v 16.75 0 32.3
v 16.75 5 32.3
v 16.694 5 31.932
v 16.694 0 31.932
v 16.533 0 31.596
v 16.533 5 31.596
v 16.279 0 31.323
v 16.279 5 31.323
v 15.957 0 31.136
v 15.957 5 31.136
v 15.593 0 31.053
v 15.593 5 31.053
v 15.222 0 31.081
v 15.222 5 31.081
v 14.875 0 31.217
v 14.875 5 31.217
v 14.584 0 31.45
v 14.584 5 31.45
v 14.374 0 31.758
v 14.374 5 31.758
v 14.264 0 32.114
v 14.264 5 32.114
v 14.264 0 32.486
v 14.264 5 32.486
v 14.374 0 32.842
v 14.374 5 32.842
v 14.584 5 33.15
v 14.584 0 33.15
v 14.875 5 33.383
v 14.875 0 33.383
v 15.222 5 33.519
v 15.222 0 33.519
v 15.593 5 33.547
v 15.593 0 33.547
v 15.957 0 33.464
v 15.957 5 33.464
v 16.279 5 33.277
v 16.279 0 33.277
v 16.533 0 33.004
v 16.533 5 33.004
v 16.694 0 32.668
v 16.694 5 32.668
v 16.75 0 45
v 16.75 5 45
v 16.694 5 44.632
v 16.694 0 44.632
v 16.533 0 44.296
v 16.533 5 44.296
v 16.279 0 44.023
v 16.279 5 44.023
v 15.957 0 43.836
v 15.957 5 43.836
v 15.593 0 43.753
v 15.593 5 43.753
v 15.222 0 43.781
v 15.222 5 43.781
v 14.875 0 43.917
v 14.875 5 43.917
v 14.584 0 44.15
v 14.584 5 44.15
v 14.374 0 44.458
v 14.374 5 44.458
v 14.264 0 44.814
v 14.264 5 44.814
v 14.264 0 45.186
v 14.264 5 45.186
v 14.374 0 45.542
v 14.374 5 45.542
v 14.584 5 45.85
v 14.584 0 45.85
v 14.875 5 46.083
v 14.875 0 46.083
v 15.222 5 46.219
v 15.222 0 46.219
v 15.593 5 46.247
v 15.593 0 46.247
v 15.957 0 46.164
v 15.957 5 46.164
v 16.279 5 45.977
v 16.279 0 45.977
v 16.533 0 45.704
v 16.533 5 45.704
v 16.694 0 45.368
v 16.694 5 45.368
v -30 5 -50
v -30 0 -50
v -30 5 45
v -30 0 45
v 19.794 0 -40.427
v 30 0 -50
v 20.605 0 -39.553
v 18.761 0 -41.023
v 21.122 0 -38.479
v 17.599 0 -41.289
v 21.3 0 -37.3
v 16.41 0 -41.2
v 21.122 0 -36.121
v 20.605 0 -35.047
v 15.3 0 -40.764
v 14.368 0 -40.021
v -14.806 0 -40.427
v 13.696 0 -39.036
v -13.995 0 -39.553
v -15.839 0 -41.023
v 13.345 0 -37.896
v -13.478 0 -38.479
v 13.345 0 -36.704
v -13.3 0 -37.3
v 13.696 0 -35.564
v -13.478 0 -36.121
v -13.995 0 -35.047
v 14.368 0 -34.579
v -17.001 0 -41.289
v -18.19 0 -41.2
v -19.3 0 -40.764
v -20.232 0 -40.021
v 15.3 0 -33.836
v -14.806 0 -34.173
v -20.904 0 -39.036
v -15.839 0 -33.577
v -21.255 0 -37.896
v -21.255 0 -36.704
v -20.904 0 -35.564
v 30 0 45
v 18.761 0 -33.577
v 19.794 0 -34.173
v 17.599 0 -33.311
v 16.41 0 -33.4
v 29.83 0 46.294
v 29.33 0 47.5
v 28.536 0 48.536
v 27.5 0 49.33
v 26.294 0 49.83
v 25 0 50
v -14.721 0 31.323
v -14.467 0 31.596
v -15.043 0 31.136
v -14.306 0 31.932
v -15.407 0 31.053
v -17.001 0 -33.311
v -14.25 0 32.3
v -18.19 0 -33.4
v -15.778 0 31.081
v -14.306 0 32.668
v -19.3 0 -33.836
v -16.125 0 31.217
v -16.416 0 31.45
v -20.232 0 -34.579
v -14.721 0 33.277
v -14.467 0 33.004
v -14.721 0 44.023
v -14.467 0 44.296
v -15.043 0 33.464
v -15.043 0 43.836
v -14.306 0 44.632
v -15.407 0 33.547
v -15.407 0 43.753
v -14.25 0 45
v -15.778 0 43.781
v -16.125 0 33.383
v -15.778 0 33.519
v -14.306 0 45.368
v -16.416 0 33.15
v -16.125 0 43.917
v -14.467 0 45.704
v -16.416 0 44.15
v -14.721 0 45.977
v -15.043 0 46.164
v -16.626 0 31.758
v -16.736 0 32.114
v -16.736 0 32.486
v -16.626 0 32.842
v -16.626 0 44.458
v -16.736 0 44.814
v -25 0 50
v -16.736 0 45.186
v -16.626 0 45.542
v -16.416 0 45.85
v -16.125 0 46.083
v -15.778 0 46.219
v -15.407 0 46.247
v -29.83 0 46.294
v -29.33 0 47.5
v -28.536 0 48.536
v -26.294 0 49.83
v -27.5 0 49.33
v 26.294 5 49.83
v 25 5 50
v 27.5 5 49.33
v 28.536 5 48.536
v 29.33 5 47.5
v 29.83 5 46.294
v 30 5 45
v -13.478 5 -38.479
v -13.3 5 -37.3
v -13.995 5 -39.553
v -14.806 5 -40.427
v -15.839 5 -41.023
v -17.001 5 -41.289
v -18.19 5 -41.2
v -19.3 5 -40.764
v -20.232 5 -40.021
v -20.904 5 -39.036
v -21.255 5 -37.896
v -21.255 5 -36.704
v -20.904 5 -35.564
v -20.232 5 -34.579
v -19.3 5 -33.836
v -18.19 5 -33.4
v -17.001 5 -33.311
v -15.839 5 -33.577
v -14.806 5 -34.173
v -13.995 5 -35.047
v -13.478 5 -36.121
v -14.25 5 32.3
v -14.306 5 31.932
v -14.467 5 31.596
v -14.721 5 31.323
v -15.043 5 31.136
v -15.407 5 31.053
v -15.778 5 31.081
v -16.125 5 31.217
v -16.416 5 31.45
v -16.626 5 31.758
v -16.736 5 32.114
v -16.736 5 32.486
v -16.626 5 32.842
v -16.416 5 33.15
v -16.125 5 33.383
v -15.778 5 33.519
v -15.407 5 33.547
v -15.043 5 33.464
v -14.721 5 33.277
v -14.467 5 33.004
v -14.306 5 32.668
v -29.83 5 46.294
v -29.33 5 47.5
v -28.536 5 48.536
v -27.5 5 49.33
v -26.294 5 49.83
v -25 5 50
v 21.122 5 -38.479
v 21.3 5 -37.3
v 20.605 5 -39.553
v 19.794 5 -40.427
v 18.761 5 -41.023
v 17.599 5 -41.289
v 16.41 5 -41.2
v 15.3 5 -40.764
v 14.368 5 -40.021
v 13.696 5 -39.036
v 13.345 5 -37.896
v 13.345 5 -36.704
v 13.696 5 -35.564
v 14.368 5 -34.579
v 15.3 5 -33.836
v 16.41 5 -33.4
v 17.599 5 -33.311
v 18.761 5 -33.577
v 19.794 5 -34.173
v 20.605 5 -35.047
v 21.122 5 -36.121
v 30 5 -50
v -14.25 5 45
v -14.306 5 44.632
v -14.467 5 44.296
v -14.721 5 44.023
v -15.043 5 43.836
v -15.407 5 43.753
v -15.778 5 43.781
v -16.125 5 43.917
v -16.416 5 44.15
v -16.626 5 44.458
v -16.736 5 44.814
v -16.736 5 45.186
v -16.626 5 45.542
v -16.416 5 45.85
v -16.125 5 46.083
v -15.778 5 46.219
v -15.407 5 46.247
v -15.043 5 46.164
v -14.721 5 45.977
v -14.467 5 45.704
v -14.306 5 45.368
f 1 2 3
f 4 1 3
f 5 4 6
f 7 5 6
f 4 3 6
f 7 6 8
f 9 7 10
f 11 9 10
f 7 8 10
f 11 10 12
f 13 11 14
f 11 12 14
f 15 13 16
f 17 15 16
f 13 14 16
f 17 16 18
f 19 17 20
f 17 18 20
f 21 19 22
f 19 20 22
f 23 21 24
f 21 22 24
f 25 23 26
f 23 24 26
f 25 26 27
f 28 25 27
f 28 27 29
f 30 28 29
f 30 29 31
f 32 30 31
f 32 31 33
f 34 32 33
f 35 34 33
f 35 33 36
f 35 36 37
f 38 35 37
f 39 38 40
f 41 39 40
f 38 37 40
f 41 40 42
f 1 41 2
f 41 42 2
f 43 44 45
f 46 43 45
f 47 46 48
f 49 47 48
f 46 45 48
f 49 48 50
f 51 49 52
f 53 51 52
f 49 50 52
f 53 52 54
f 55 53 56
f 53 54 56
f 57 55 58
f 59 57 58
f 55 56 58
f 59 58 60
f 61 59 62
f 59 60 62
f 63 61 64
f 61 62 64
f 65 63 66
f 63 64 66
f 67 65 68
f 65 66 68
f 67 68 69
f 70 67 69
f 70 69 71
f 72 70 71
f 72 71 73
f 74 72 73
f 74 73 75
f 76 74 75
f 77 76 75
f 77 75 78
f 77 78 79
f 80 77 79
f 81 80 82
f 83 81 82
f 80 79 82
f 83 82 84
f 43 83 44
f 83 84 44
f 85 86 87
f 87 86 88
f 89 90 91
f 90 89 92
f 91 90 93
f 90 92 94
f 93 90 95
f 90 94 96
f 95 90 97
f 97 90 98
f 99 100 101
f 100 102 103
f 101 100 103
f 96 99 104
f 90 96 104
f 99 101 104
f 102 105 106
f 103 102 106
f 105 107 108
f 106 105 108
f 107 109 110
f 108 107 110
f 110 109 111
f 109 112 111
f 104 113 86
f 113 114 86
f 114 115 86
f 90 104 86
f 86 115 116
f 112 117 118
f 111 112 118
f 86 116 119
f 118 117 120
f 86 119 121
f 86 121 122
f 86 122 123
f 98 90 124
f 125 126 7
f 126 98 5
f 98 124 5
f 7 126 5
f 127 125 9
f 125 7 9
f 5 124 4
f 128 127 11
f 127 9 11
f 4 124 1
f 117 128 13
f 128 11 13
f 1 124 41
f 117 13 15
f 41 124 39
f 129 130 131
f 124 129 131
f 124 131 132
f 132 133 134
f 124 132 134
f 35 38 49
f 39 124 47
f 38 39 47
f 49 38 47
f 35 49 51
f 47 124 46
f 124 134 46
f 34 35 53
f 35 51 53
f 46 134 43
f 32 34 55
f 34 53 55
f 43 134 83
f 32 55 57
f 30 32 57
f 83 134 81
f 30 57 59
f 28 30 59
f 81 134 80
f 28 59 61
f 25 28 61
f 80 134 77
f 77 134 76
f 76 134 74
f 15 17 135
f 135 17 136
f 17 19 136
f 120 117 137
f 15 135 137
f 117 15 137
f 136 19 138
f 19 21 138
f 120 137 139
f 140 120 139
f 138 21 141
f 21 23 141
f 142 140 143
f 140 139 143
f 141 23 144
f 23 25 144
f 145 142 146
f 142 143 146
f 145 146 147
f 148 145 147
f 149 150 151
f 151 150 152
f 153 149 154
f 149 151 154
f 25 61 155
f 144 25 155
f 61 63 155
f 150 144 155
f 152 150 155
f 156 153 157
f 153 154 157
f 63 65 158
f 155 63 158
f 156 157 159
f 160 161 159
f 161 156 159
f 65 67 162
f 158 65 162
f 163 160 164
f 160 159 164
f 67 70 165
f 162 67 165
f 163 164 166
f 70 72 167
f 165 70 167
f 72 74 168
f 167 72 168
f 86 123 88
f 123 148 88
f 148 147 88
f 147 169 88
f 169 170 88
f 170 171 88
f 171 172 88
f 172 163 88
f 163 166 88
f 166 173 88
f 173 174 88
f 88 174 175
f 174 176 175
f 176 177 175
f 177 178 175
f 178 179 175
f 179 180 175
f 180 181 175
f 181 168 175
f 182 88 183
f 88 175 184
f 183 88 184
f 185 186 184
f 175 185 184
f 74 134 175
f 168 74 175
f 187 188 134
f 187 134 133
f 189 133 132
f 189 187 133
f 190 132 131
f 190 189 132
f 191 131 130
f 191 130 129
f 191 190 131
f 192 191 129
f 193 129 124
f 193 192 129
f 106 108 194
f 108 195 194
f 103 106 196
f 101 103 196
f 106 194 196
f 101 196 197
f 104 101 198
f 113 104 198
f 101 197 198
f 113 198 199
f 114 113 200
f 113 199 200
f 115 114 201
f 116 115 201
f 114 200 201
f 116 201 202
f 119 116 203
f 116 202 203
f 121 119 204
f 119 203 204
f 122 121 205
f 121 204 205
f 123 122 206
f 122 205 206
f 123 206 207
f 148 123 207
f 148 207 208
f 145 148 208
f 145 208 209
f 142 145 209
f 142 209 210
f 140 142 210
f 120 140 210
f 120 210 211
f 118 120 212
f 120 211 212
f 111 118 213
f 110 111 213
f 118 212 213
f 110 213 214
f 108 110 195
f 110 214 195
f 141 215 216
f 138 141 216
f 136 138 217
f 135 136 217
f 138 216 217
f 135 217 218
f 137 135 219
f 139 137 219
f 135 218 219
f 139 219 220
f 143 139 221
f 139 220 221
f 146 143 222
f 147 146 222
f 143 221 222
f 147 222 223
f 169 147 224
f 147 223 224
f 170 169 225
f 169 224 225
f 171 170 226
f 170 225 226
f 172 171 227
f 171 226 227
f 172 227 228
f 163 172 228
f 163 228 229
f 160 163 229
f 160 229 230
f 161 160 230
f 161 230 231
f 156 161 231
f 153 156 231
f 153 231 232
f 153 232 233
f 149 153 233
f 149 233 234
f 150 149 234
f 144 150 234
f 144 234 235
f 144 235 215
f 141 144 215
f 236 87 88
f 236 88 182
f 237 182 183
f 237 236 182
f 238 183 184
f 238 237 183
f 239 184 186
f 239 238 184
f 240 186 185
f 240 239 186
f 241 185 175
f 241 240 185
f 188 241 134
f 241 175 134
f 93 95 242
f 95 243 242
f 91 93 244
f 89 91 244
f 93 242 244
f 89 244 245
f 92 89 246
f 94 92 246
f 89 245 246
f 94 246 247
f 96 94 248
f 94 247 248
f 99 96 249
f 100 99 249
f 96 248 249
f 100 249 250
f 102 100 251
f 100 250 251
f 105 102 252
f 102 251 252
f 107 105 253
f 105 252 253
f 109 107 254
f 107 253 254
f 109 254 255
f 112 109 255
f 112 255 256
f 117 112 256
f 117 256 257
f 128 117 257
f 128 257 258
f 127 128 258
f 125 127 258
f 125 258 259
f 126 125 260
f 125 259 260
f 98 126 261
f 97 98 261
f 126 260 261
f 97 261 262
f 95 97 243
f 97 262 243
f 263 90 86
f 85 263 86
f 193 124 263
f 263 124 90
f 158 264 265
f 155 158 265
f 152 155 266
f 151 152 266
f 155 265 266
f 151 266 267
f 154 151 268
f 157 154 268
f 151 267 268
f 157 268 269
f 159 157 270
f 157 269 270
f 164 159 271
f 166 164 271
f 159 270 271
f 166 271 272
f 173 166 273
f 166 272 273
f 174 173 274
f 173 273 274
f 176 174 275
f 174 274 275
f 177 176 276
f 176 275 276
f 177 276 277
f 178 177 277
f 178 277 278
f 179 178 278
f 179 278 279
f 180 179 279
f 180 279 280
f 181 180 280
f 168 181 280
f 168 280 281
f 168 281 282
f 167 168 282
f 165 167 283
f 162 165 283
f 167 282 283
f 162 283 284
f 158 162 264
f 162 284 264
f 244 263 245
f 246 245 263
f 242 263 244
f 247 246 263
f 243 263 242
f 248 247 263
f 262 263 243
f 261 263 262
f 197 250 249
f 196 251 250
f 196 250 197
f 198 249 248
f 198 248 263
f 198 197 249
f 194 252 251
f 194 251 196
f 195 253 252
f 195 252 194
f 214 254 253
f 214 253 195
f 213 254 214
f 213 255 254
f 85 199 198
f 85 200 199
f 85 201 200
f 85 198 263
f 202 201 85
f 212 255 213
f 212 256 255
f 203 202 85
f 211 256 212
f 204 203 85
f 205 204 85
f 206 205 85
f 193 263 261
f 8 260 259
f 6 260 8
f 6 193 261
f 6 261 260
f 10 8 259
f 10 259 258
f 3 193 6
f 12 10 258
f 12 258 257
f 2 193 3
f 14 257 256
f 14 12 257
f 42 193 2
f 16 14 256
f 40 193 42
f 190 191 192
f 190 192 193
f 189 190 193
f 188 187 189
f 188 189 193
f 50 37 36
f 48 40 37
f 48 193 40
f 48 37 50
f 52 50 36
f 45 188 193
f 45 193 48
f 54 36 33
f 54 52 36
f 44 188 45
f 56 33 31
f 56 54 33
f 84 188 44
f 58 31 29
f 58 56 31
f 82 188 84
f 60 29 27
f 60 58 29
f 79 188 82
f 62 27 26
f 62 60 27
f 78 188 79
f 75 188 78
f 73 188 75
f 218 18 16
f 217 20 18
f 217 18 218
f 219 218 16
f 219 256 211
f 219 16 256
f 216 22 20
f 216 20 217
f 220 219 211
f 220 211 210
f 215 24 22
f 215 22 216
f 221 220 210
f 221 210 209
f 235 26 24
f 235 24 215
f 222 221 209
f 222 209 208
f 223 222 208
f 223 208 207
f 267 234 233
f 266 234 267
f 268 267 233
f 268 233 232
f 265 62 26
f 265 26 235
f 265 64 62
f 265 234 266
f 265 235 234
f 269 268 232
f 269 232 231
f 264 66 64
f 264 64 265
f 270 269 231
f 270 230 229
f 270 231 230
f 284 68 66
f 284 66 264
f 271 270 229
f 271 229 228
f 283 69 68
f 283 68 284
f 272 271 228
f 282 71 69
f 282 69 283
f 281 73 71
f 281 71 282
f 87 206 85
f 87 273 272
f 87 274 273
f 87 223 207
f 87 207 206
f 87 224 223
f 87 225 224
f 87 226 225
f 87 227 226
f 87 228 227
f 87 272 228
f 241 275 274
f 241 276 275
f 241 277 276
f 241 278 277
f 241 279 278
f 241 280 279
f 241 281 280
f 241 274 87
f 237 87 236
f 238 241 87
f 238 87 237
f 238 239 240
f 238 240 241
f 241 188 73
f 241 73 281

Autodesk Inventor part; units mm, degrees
ref_plane "YZ Plane" through (0, 0, 0) normal (1, 0, 0) x (0, 1, 0)
ref_plane "XZ Plane" through (0, 0, 0) normal (0, 1, 0) x (-1, 0, 0)
ref_plane "XY Plane" through (0, 0, 0) normal (0, 0, 1) x (1, 0, 0)
sketch "Sketch1" plane through (0, 0, 0) normal (0, 1, 0) x (-1, 0, 0)
  line L0 (30, 50) -> (-30, 50)
  line L1 (-30, 50) -> (-30, -50)
  line L2 (-30, -50) -> (30, -50)
  line L3 (30, -50) -> (30, 50)
  line L4 (30, 50) -> (-30, -50) construction
  line L5 (-30, 50) -> (30, -50) construction
  point P0 (0, 0)
  dimension "d0" = 60
  dimension "d1" = 100
extrude "Extrusion1" add sketch "Sketch1" along normal blind 5
sketch "Sketch2" plane through (0, 5, 0) normal (0, 1, 0) x (1, 0, 0)
  circle A0 centre (15.5, -45) radius 1.25
  circle A1 centre (15.5, -32.3) radius 1.25
  line L0 (-30, -50) -> (30, -50) projected
  line L1 (30, -50) -> (30, 50) projected
  circle A2 centre (-15.5, -45) radius 1.25
  line L2 (-30, 50) -> (-30, -50) projected
  circle A3 centre (-15.5, -32.3) radius 1.25
  point P0 (0, 0)
  dimension "d4" = 2.5
  dimension "d5" = 2.5
  dimension "d6" = 12.7
  dimension "d7" = 5
  dimension "d8" = 14.5
  dimension "d9" = 14.5
  dimension "d10" = 2.5
  dimension "d11" = 14.5
  dimension "d12" = 2.5
extrude "Extrusion2" cut sketch "Sketch2" against normal up to next
sketch "Sketch3" plane through (0, 5, 0) normal (0, 1, 0) x (1, 0, 0)
  circle A0 centre (-17.3, 37.3) radius 4
  line L0 (30, 50) -> (-30, 50) projected
  line L1 (-30, 50) -> (-30, -50) projected
  circle A1 centre (17.3, 37.3) radius 4
  line L2 (30, -50) -> (30, 50) projected
  point P0 (0, 0)
  dimension "d15" = 8
  dimension "d16" = 12.7
  dimension "d17" = 12.7
  dimension "d18" = 8
  dimension "d19" = 12.7
extrude "Extrusion3" cut sketch "Sketch3" against normal up to next
fillet "Fillet1" radius 5 2 edges at (30, 2.5, 50) (-30, 2.5, 50)
properties part number "3way_final_valve_mount"
